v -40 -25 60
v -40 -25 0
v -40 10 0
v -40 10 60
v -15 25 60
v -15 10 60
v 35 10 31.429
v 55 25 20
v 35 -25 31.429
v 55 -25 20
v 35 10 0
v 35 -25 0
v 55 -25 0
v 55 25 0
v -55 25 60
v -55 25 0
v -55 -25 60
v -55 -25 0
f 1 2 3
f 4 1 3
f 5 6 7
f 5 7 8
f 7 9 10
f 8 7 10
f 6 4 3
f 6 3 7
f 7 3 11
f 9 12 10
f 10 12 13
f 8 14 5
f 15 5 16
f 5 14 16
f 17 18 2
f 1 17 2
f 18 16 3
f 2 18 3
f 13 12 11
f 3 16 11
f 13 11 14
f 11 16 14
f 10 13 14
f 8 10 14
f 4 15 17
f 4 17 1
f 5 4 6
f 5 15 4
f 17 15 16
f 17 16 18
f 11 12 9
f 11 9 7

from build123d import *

# Parameters (mm, degrees)
F0_W     = 20
F0_H     = 15
F0_W_2   = 75
F0_H_2   = 35
F0_W_3   = 15
F1_DEPTH = 60
F3_DEPTH = 50


with BuildPart() as f1:
    # F0 (on Top) → F1 (new body)
    with BuildSketch(Plane.XY):
        with Locations((45, 17.5)):
            Rectangle(F0_W, F0_H)
        with Locations((-2.5, 17.5)):
            Rectangle(F0_W_2, F0_H)
        with Locations((45, -7.5)):
            Rectangle(F0_W, F0_H_2)
        with Locations((-47.5, 17.5)):
            Rectangle(F0_W_3, F0_H)
        with Locations((-47.5, -7.5)):
            Rectangle(F0_W_3, F0_H_2)
    extrude(amount=F1_DEPTH)

    # F2 (on face) → F3 (cut)
    with BuildSketch(Plane.XZ.offset(25)):
        Polygon((55, 60), (-15, 60), (55, 20), align=None)
    extrude(amount=-F3_DEPTH, mode=Mode.SUBTRACT)


solid = f1.part
